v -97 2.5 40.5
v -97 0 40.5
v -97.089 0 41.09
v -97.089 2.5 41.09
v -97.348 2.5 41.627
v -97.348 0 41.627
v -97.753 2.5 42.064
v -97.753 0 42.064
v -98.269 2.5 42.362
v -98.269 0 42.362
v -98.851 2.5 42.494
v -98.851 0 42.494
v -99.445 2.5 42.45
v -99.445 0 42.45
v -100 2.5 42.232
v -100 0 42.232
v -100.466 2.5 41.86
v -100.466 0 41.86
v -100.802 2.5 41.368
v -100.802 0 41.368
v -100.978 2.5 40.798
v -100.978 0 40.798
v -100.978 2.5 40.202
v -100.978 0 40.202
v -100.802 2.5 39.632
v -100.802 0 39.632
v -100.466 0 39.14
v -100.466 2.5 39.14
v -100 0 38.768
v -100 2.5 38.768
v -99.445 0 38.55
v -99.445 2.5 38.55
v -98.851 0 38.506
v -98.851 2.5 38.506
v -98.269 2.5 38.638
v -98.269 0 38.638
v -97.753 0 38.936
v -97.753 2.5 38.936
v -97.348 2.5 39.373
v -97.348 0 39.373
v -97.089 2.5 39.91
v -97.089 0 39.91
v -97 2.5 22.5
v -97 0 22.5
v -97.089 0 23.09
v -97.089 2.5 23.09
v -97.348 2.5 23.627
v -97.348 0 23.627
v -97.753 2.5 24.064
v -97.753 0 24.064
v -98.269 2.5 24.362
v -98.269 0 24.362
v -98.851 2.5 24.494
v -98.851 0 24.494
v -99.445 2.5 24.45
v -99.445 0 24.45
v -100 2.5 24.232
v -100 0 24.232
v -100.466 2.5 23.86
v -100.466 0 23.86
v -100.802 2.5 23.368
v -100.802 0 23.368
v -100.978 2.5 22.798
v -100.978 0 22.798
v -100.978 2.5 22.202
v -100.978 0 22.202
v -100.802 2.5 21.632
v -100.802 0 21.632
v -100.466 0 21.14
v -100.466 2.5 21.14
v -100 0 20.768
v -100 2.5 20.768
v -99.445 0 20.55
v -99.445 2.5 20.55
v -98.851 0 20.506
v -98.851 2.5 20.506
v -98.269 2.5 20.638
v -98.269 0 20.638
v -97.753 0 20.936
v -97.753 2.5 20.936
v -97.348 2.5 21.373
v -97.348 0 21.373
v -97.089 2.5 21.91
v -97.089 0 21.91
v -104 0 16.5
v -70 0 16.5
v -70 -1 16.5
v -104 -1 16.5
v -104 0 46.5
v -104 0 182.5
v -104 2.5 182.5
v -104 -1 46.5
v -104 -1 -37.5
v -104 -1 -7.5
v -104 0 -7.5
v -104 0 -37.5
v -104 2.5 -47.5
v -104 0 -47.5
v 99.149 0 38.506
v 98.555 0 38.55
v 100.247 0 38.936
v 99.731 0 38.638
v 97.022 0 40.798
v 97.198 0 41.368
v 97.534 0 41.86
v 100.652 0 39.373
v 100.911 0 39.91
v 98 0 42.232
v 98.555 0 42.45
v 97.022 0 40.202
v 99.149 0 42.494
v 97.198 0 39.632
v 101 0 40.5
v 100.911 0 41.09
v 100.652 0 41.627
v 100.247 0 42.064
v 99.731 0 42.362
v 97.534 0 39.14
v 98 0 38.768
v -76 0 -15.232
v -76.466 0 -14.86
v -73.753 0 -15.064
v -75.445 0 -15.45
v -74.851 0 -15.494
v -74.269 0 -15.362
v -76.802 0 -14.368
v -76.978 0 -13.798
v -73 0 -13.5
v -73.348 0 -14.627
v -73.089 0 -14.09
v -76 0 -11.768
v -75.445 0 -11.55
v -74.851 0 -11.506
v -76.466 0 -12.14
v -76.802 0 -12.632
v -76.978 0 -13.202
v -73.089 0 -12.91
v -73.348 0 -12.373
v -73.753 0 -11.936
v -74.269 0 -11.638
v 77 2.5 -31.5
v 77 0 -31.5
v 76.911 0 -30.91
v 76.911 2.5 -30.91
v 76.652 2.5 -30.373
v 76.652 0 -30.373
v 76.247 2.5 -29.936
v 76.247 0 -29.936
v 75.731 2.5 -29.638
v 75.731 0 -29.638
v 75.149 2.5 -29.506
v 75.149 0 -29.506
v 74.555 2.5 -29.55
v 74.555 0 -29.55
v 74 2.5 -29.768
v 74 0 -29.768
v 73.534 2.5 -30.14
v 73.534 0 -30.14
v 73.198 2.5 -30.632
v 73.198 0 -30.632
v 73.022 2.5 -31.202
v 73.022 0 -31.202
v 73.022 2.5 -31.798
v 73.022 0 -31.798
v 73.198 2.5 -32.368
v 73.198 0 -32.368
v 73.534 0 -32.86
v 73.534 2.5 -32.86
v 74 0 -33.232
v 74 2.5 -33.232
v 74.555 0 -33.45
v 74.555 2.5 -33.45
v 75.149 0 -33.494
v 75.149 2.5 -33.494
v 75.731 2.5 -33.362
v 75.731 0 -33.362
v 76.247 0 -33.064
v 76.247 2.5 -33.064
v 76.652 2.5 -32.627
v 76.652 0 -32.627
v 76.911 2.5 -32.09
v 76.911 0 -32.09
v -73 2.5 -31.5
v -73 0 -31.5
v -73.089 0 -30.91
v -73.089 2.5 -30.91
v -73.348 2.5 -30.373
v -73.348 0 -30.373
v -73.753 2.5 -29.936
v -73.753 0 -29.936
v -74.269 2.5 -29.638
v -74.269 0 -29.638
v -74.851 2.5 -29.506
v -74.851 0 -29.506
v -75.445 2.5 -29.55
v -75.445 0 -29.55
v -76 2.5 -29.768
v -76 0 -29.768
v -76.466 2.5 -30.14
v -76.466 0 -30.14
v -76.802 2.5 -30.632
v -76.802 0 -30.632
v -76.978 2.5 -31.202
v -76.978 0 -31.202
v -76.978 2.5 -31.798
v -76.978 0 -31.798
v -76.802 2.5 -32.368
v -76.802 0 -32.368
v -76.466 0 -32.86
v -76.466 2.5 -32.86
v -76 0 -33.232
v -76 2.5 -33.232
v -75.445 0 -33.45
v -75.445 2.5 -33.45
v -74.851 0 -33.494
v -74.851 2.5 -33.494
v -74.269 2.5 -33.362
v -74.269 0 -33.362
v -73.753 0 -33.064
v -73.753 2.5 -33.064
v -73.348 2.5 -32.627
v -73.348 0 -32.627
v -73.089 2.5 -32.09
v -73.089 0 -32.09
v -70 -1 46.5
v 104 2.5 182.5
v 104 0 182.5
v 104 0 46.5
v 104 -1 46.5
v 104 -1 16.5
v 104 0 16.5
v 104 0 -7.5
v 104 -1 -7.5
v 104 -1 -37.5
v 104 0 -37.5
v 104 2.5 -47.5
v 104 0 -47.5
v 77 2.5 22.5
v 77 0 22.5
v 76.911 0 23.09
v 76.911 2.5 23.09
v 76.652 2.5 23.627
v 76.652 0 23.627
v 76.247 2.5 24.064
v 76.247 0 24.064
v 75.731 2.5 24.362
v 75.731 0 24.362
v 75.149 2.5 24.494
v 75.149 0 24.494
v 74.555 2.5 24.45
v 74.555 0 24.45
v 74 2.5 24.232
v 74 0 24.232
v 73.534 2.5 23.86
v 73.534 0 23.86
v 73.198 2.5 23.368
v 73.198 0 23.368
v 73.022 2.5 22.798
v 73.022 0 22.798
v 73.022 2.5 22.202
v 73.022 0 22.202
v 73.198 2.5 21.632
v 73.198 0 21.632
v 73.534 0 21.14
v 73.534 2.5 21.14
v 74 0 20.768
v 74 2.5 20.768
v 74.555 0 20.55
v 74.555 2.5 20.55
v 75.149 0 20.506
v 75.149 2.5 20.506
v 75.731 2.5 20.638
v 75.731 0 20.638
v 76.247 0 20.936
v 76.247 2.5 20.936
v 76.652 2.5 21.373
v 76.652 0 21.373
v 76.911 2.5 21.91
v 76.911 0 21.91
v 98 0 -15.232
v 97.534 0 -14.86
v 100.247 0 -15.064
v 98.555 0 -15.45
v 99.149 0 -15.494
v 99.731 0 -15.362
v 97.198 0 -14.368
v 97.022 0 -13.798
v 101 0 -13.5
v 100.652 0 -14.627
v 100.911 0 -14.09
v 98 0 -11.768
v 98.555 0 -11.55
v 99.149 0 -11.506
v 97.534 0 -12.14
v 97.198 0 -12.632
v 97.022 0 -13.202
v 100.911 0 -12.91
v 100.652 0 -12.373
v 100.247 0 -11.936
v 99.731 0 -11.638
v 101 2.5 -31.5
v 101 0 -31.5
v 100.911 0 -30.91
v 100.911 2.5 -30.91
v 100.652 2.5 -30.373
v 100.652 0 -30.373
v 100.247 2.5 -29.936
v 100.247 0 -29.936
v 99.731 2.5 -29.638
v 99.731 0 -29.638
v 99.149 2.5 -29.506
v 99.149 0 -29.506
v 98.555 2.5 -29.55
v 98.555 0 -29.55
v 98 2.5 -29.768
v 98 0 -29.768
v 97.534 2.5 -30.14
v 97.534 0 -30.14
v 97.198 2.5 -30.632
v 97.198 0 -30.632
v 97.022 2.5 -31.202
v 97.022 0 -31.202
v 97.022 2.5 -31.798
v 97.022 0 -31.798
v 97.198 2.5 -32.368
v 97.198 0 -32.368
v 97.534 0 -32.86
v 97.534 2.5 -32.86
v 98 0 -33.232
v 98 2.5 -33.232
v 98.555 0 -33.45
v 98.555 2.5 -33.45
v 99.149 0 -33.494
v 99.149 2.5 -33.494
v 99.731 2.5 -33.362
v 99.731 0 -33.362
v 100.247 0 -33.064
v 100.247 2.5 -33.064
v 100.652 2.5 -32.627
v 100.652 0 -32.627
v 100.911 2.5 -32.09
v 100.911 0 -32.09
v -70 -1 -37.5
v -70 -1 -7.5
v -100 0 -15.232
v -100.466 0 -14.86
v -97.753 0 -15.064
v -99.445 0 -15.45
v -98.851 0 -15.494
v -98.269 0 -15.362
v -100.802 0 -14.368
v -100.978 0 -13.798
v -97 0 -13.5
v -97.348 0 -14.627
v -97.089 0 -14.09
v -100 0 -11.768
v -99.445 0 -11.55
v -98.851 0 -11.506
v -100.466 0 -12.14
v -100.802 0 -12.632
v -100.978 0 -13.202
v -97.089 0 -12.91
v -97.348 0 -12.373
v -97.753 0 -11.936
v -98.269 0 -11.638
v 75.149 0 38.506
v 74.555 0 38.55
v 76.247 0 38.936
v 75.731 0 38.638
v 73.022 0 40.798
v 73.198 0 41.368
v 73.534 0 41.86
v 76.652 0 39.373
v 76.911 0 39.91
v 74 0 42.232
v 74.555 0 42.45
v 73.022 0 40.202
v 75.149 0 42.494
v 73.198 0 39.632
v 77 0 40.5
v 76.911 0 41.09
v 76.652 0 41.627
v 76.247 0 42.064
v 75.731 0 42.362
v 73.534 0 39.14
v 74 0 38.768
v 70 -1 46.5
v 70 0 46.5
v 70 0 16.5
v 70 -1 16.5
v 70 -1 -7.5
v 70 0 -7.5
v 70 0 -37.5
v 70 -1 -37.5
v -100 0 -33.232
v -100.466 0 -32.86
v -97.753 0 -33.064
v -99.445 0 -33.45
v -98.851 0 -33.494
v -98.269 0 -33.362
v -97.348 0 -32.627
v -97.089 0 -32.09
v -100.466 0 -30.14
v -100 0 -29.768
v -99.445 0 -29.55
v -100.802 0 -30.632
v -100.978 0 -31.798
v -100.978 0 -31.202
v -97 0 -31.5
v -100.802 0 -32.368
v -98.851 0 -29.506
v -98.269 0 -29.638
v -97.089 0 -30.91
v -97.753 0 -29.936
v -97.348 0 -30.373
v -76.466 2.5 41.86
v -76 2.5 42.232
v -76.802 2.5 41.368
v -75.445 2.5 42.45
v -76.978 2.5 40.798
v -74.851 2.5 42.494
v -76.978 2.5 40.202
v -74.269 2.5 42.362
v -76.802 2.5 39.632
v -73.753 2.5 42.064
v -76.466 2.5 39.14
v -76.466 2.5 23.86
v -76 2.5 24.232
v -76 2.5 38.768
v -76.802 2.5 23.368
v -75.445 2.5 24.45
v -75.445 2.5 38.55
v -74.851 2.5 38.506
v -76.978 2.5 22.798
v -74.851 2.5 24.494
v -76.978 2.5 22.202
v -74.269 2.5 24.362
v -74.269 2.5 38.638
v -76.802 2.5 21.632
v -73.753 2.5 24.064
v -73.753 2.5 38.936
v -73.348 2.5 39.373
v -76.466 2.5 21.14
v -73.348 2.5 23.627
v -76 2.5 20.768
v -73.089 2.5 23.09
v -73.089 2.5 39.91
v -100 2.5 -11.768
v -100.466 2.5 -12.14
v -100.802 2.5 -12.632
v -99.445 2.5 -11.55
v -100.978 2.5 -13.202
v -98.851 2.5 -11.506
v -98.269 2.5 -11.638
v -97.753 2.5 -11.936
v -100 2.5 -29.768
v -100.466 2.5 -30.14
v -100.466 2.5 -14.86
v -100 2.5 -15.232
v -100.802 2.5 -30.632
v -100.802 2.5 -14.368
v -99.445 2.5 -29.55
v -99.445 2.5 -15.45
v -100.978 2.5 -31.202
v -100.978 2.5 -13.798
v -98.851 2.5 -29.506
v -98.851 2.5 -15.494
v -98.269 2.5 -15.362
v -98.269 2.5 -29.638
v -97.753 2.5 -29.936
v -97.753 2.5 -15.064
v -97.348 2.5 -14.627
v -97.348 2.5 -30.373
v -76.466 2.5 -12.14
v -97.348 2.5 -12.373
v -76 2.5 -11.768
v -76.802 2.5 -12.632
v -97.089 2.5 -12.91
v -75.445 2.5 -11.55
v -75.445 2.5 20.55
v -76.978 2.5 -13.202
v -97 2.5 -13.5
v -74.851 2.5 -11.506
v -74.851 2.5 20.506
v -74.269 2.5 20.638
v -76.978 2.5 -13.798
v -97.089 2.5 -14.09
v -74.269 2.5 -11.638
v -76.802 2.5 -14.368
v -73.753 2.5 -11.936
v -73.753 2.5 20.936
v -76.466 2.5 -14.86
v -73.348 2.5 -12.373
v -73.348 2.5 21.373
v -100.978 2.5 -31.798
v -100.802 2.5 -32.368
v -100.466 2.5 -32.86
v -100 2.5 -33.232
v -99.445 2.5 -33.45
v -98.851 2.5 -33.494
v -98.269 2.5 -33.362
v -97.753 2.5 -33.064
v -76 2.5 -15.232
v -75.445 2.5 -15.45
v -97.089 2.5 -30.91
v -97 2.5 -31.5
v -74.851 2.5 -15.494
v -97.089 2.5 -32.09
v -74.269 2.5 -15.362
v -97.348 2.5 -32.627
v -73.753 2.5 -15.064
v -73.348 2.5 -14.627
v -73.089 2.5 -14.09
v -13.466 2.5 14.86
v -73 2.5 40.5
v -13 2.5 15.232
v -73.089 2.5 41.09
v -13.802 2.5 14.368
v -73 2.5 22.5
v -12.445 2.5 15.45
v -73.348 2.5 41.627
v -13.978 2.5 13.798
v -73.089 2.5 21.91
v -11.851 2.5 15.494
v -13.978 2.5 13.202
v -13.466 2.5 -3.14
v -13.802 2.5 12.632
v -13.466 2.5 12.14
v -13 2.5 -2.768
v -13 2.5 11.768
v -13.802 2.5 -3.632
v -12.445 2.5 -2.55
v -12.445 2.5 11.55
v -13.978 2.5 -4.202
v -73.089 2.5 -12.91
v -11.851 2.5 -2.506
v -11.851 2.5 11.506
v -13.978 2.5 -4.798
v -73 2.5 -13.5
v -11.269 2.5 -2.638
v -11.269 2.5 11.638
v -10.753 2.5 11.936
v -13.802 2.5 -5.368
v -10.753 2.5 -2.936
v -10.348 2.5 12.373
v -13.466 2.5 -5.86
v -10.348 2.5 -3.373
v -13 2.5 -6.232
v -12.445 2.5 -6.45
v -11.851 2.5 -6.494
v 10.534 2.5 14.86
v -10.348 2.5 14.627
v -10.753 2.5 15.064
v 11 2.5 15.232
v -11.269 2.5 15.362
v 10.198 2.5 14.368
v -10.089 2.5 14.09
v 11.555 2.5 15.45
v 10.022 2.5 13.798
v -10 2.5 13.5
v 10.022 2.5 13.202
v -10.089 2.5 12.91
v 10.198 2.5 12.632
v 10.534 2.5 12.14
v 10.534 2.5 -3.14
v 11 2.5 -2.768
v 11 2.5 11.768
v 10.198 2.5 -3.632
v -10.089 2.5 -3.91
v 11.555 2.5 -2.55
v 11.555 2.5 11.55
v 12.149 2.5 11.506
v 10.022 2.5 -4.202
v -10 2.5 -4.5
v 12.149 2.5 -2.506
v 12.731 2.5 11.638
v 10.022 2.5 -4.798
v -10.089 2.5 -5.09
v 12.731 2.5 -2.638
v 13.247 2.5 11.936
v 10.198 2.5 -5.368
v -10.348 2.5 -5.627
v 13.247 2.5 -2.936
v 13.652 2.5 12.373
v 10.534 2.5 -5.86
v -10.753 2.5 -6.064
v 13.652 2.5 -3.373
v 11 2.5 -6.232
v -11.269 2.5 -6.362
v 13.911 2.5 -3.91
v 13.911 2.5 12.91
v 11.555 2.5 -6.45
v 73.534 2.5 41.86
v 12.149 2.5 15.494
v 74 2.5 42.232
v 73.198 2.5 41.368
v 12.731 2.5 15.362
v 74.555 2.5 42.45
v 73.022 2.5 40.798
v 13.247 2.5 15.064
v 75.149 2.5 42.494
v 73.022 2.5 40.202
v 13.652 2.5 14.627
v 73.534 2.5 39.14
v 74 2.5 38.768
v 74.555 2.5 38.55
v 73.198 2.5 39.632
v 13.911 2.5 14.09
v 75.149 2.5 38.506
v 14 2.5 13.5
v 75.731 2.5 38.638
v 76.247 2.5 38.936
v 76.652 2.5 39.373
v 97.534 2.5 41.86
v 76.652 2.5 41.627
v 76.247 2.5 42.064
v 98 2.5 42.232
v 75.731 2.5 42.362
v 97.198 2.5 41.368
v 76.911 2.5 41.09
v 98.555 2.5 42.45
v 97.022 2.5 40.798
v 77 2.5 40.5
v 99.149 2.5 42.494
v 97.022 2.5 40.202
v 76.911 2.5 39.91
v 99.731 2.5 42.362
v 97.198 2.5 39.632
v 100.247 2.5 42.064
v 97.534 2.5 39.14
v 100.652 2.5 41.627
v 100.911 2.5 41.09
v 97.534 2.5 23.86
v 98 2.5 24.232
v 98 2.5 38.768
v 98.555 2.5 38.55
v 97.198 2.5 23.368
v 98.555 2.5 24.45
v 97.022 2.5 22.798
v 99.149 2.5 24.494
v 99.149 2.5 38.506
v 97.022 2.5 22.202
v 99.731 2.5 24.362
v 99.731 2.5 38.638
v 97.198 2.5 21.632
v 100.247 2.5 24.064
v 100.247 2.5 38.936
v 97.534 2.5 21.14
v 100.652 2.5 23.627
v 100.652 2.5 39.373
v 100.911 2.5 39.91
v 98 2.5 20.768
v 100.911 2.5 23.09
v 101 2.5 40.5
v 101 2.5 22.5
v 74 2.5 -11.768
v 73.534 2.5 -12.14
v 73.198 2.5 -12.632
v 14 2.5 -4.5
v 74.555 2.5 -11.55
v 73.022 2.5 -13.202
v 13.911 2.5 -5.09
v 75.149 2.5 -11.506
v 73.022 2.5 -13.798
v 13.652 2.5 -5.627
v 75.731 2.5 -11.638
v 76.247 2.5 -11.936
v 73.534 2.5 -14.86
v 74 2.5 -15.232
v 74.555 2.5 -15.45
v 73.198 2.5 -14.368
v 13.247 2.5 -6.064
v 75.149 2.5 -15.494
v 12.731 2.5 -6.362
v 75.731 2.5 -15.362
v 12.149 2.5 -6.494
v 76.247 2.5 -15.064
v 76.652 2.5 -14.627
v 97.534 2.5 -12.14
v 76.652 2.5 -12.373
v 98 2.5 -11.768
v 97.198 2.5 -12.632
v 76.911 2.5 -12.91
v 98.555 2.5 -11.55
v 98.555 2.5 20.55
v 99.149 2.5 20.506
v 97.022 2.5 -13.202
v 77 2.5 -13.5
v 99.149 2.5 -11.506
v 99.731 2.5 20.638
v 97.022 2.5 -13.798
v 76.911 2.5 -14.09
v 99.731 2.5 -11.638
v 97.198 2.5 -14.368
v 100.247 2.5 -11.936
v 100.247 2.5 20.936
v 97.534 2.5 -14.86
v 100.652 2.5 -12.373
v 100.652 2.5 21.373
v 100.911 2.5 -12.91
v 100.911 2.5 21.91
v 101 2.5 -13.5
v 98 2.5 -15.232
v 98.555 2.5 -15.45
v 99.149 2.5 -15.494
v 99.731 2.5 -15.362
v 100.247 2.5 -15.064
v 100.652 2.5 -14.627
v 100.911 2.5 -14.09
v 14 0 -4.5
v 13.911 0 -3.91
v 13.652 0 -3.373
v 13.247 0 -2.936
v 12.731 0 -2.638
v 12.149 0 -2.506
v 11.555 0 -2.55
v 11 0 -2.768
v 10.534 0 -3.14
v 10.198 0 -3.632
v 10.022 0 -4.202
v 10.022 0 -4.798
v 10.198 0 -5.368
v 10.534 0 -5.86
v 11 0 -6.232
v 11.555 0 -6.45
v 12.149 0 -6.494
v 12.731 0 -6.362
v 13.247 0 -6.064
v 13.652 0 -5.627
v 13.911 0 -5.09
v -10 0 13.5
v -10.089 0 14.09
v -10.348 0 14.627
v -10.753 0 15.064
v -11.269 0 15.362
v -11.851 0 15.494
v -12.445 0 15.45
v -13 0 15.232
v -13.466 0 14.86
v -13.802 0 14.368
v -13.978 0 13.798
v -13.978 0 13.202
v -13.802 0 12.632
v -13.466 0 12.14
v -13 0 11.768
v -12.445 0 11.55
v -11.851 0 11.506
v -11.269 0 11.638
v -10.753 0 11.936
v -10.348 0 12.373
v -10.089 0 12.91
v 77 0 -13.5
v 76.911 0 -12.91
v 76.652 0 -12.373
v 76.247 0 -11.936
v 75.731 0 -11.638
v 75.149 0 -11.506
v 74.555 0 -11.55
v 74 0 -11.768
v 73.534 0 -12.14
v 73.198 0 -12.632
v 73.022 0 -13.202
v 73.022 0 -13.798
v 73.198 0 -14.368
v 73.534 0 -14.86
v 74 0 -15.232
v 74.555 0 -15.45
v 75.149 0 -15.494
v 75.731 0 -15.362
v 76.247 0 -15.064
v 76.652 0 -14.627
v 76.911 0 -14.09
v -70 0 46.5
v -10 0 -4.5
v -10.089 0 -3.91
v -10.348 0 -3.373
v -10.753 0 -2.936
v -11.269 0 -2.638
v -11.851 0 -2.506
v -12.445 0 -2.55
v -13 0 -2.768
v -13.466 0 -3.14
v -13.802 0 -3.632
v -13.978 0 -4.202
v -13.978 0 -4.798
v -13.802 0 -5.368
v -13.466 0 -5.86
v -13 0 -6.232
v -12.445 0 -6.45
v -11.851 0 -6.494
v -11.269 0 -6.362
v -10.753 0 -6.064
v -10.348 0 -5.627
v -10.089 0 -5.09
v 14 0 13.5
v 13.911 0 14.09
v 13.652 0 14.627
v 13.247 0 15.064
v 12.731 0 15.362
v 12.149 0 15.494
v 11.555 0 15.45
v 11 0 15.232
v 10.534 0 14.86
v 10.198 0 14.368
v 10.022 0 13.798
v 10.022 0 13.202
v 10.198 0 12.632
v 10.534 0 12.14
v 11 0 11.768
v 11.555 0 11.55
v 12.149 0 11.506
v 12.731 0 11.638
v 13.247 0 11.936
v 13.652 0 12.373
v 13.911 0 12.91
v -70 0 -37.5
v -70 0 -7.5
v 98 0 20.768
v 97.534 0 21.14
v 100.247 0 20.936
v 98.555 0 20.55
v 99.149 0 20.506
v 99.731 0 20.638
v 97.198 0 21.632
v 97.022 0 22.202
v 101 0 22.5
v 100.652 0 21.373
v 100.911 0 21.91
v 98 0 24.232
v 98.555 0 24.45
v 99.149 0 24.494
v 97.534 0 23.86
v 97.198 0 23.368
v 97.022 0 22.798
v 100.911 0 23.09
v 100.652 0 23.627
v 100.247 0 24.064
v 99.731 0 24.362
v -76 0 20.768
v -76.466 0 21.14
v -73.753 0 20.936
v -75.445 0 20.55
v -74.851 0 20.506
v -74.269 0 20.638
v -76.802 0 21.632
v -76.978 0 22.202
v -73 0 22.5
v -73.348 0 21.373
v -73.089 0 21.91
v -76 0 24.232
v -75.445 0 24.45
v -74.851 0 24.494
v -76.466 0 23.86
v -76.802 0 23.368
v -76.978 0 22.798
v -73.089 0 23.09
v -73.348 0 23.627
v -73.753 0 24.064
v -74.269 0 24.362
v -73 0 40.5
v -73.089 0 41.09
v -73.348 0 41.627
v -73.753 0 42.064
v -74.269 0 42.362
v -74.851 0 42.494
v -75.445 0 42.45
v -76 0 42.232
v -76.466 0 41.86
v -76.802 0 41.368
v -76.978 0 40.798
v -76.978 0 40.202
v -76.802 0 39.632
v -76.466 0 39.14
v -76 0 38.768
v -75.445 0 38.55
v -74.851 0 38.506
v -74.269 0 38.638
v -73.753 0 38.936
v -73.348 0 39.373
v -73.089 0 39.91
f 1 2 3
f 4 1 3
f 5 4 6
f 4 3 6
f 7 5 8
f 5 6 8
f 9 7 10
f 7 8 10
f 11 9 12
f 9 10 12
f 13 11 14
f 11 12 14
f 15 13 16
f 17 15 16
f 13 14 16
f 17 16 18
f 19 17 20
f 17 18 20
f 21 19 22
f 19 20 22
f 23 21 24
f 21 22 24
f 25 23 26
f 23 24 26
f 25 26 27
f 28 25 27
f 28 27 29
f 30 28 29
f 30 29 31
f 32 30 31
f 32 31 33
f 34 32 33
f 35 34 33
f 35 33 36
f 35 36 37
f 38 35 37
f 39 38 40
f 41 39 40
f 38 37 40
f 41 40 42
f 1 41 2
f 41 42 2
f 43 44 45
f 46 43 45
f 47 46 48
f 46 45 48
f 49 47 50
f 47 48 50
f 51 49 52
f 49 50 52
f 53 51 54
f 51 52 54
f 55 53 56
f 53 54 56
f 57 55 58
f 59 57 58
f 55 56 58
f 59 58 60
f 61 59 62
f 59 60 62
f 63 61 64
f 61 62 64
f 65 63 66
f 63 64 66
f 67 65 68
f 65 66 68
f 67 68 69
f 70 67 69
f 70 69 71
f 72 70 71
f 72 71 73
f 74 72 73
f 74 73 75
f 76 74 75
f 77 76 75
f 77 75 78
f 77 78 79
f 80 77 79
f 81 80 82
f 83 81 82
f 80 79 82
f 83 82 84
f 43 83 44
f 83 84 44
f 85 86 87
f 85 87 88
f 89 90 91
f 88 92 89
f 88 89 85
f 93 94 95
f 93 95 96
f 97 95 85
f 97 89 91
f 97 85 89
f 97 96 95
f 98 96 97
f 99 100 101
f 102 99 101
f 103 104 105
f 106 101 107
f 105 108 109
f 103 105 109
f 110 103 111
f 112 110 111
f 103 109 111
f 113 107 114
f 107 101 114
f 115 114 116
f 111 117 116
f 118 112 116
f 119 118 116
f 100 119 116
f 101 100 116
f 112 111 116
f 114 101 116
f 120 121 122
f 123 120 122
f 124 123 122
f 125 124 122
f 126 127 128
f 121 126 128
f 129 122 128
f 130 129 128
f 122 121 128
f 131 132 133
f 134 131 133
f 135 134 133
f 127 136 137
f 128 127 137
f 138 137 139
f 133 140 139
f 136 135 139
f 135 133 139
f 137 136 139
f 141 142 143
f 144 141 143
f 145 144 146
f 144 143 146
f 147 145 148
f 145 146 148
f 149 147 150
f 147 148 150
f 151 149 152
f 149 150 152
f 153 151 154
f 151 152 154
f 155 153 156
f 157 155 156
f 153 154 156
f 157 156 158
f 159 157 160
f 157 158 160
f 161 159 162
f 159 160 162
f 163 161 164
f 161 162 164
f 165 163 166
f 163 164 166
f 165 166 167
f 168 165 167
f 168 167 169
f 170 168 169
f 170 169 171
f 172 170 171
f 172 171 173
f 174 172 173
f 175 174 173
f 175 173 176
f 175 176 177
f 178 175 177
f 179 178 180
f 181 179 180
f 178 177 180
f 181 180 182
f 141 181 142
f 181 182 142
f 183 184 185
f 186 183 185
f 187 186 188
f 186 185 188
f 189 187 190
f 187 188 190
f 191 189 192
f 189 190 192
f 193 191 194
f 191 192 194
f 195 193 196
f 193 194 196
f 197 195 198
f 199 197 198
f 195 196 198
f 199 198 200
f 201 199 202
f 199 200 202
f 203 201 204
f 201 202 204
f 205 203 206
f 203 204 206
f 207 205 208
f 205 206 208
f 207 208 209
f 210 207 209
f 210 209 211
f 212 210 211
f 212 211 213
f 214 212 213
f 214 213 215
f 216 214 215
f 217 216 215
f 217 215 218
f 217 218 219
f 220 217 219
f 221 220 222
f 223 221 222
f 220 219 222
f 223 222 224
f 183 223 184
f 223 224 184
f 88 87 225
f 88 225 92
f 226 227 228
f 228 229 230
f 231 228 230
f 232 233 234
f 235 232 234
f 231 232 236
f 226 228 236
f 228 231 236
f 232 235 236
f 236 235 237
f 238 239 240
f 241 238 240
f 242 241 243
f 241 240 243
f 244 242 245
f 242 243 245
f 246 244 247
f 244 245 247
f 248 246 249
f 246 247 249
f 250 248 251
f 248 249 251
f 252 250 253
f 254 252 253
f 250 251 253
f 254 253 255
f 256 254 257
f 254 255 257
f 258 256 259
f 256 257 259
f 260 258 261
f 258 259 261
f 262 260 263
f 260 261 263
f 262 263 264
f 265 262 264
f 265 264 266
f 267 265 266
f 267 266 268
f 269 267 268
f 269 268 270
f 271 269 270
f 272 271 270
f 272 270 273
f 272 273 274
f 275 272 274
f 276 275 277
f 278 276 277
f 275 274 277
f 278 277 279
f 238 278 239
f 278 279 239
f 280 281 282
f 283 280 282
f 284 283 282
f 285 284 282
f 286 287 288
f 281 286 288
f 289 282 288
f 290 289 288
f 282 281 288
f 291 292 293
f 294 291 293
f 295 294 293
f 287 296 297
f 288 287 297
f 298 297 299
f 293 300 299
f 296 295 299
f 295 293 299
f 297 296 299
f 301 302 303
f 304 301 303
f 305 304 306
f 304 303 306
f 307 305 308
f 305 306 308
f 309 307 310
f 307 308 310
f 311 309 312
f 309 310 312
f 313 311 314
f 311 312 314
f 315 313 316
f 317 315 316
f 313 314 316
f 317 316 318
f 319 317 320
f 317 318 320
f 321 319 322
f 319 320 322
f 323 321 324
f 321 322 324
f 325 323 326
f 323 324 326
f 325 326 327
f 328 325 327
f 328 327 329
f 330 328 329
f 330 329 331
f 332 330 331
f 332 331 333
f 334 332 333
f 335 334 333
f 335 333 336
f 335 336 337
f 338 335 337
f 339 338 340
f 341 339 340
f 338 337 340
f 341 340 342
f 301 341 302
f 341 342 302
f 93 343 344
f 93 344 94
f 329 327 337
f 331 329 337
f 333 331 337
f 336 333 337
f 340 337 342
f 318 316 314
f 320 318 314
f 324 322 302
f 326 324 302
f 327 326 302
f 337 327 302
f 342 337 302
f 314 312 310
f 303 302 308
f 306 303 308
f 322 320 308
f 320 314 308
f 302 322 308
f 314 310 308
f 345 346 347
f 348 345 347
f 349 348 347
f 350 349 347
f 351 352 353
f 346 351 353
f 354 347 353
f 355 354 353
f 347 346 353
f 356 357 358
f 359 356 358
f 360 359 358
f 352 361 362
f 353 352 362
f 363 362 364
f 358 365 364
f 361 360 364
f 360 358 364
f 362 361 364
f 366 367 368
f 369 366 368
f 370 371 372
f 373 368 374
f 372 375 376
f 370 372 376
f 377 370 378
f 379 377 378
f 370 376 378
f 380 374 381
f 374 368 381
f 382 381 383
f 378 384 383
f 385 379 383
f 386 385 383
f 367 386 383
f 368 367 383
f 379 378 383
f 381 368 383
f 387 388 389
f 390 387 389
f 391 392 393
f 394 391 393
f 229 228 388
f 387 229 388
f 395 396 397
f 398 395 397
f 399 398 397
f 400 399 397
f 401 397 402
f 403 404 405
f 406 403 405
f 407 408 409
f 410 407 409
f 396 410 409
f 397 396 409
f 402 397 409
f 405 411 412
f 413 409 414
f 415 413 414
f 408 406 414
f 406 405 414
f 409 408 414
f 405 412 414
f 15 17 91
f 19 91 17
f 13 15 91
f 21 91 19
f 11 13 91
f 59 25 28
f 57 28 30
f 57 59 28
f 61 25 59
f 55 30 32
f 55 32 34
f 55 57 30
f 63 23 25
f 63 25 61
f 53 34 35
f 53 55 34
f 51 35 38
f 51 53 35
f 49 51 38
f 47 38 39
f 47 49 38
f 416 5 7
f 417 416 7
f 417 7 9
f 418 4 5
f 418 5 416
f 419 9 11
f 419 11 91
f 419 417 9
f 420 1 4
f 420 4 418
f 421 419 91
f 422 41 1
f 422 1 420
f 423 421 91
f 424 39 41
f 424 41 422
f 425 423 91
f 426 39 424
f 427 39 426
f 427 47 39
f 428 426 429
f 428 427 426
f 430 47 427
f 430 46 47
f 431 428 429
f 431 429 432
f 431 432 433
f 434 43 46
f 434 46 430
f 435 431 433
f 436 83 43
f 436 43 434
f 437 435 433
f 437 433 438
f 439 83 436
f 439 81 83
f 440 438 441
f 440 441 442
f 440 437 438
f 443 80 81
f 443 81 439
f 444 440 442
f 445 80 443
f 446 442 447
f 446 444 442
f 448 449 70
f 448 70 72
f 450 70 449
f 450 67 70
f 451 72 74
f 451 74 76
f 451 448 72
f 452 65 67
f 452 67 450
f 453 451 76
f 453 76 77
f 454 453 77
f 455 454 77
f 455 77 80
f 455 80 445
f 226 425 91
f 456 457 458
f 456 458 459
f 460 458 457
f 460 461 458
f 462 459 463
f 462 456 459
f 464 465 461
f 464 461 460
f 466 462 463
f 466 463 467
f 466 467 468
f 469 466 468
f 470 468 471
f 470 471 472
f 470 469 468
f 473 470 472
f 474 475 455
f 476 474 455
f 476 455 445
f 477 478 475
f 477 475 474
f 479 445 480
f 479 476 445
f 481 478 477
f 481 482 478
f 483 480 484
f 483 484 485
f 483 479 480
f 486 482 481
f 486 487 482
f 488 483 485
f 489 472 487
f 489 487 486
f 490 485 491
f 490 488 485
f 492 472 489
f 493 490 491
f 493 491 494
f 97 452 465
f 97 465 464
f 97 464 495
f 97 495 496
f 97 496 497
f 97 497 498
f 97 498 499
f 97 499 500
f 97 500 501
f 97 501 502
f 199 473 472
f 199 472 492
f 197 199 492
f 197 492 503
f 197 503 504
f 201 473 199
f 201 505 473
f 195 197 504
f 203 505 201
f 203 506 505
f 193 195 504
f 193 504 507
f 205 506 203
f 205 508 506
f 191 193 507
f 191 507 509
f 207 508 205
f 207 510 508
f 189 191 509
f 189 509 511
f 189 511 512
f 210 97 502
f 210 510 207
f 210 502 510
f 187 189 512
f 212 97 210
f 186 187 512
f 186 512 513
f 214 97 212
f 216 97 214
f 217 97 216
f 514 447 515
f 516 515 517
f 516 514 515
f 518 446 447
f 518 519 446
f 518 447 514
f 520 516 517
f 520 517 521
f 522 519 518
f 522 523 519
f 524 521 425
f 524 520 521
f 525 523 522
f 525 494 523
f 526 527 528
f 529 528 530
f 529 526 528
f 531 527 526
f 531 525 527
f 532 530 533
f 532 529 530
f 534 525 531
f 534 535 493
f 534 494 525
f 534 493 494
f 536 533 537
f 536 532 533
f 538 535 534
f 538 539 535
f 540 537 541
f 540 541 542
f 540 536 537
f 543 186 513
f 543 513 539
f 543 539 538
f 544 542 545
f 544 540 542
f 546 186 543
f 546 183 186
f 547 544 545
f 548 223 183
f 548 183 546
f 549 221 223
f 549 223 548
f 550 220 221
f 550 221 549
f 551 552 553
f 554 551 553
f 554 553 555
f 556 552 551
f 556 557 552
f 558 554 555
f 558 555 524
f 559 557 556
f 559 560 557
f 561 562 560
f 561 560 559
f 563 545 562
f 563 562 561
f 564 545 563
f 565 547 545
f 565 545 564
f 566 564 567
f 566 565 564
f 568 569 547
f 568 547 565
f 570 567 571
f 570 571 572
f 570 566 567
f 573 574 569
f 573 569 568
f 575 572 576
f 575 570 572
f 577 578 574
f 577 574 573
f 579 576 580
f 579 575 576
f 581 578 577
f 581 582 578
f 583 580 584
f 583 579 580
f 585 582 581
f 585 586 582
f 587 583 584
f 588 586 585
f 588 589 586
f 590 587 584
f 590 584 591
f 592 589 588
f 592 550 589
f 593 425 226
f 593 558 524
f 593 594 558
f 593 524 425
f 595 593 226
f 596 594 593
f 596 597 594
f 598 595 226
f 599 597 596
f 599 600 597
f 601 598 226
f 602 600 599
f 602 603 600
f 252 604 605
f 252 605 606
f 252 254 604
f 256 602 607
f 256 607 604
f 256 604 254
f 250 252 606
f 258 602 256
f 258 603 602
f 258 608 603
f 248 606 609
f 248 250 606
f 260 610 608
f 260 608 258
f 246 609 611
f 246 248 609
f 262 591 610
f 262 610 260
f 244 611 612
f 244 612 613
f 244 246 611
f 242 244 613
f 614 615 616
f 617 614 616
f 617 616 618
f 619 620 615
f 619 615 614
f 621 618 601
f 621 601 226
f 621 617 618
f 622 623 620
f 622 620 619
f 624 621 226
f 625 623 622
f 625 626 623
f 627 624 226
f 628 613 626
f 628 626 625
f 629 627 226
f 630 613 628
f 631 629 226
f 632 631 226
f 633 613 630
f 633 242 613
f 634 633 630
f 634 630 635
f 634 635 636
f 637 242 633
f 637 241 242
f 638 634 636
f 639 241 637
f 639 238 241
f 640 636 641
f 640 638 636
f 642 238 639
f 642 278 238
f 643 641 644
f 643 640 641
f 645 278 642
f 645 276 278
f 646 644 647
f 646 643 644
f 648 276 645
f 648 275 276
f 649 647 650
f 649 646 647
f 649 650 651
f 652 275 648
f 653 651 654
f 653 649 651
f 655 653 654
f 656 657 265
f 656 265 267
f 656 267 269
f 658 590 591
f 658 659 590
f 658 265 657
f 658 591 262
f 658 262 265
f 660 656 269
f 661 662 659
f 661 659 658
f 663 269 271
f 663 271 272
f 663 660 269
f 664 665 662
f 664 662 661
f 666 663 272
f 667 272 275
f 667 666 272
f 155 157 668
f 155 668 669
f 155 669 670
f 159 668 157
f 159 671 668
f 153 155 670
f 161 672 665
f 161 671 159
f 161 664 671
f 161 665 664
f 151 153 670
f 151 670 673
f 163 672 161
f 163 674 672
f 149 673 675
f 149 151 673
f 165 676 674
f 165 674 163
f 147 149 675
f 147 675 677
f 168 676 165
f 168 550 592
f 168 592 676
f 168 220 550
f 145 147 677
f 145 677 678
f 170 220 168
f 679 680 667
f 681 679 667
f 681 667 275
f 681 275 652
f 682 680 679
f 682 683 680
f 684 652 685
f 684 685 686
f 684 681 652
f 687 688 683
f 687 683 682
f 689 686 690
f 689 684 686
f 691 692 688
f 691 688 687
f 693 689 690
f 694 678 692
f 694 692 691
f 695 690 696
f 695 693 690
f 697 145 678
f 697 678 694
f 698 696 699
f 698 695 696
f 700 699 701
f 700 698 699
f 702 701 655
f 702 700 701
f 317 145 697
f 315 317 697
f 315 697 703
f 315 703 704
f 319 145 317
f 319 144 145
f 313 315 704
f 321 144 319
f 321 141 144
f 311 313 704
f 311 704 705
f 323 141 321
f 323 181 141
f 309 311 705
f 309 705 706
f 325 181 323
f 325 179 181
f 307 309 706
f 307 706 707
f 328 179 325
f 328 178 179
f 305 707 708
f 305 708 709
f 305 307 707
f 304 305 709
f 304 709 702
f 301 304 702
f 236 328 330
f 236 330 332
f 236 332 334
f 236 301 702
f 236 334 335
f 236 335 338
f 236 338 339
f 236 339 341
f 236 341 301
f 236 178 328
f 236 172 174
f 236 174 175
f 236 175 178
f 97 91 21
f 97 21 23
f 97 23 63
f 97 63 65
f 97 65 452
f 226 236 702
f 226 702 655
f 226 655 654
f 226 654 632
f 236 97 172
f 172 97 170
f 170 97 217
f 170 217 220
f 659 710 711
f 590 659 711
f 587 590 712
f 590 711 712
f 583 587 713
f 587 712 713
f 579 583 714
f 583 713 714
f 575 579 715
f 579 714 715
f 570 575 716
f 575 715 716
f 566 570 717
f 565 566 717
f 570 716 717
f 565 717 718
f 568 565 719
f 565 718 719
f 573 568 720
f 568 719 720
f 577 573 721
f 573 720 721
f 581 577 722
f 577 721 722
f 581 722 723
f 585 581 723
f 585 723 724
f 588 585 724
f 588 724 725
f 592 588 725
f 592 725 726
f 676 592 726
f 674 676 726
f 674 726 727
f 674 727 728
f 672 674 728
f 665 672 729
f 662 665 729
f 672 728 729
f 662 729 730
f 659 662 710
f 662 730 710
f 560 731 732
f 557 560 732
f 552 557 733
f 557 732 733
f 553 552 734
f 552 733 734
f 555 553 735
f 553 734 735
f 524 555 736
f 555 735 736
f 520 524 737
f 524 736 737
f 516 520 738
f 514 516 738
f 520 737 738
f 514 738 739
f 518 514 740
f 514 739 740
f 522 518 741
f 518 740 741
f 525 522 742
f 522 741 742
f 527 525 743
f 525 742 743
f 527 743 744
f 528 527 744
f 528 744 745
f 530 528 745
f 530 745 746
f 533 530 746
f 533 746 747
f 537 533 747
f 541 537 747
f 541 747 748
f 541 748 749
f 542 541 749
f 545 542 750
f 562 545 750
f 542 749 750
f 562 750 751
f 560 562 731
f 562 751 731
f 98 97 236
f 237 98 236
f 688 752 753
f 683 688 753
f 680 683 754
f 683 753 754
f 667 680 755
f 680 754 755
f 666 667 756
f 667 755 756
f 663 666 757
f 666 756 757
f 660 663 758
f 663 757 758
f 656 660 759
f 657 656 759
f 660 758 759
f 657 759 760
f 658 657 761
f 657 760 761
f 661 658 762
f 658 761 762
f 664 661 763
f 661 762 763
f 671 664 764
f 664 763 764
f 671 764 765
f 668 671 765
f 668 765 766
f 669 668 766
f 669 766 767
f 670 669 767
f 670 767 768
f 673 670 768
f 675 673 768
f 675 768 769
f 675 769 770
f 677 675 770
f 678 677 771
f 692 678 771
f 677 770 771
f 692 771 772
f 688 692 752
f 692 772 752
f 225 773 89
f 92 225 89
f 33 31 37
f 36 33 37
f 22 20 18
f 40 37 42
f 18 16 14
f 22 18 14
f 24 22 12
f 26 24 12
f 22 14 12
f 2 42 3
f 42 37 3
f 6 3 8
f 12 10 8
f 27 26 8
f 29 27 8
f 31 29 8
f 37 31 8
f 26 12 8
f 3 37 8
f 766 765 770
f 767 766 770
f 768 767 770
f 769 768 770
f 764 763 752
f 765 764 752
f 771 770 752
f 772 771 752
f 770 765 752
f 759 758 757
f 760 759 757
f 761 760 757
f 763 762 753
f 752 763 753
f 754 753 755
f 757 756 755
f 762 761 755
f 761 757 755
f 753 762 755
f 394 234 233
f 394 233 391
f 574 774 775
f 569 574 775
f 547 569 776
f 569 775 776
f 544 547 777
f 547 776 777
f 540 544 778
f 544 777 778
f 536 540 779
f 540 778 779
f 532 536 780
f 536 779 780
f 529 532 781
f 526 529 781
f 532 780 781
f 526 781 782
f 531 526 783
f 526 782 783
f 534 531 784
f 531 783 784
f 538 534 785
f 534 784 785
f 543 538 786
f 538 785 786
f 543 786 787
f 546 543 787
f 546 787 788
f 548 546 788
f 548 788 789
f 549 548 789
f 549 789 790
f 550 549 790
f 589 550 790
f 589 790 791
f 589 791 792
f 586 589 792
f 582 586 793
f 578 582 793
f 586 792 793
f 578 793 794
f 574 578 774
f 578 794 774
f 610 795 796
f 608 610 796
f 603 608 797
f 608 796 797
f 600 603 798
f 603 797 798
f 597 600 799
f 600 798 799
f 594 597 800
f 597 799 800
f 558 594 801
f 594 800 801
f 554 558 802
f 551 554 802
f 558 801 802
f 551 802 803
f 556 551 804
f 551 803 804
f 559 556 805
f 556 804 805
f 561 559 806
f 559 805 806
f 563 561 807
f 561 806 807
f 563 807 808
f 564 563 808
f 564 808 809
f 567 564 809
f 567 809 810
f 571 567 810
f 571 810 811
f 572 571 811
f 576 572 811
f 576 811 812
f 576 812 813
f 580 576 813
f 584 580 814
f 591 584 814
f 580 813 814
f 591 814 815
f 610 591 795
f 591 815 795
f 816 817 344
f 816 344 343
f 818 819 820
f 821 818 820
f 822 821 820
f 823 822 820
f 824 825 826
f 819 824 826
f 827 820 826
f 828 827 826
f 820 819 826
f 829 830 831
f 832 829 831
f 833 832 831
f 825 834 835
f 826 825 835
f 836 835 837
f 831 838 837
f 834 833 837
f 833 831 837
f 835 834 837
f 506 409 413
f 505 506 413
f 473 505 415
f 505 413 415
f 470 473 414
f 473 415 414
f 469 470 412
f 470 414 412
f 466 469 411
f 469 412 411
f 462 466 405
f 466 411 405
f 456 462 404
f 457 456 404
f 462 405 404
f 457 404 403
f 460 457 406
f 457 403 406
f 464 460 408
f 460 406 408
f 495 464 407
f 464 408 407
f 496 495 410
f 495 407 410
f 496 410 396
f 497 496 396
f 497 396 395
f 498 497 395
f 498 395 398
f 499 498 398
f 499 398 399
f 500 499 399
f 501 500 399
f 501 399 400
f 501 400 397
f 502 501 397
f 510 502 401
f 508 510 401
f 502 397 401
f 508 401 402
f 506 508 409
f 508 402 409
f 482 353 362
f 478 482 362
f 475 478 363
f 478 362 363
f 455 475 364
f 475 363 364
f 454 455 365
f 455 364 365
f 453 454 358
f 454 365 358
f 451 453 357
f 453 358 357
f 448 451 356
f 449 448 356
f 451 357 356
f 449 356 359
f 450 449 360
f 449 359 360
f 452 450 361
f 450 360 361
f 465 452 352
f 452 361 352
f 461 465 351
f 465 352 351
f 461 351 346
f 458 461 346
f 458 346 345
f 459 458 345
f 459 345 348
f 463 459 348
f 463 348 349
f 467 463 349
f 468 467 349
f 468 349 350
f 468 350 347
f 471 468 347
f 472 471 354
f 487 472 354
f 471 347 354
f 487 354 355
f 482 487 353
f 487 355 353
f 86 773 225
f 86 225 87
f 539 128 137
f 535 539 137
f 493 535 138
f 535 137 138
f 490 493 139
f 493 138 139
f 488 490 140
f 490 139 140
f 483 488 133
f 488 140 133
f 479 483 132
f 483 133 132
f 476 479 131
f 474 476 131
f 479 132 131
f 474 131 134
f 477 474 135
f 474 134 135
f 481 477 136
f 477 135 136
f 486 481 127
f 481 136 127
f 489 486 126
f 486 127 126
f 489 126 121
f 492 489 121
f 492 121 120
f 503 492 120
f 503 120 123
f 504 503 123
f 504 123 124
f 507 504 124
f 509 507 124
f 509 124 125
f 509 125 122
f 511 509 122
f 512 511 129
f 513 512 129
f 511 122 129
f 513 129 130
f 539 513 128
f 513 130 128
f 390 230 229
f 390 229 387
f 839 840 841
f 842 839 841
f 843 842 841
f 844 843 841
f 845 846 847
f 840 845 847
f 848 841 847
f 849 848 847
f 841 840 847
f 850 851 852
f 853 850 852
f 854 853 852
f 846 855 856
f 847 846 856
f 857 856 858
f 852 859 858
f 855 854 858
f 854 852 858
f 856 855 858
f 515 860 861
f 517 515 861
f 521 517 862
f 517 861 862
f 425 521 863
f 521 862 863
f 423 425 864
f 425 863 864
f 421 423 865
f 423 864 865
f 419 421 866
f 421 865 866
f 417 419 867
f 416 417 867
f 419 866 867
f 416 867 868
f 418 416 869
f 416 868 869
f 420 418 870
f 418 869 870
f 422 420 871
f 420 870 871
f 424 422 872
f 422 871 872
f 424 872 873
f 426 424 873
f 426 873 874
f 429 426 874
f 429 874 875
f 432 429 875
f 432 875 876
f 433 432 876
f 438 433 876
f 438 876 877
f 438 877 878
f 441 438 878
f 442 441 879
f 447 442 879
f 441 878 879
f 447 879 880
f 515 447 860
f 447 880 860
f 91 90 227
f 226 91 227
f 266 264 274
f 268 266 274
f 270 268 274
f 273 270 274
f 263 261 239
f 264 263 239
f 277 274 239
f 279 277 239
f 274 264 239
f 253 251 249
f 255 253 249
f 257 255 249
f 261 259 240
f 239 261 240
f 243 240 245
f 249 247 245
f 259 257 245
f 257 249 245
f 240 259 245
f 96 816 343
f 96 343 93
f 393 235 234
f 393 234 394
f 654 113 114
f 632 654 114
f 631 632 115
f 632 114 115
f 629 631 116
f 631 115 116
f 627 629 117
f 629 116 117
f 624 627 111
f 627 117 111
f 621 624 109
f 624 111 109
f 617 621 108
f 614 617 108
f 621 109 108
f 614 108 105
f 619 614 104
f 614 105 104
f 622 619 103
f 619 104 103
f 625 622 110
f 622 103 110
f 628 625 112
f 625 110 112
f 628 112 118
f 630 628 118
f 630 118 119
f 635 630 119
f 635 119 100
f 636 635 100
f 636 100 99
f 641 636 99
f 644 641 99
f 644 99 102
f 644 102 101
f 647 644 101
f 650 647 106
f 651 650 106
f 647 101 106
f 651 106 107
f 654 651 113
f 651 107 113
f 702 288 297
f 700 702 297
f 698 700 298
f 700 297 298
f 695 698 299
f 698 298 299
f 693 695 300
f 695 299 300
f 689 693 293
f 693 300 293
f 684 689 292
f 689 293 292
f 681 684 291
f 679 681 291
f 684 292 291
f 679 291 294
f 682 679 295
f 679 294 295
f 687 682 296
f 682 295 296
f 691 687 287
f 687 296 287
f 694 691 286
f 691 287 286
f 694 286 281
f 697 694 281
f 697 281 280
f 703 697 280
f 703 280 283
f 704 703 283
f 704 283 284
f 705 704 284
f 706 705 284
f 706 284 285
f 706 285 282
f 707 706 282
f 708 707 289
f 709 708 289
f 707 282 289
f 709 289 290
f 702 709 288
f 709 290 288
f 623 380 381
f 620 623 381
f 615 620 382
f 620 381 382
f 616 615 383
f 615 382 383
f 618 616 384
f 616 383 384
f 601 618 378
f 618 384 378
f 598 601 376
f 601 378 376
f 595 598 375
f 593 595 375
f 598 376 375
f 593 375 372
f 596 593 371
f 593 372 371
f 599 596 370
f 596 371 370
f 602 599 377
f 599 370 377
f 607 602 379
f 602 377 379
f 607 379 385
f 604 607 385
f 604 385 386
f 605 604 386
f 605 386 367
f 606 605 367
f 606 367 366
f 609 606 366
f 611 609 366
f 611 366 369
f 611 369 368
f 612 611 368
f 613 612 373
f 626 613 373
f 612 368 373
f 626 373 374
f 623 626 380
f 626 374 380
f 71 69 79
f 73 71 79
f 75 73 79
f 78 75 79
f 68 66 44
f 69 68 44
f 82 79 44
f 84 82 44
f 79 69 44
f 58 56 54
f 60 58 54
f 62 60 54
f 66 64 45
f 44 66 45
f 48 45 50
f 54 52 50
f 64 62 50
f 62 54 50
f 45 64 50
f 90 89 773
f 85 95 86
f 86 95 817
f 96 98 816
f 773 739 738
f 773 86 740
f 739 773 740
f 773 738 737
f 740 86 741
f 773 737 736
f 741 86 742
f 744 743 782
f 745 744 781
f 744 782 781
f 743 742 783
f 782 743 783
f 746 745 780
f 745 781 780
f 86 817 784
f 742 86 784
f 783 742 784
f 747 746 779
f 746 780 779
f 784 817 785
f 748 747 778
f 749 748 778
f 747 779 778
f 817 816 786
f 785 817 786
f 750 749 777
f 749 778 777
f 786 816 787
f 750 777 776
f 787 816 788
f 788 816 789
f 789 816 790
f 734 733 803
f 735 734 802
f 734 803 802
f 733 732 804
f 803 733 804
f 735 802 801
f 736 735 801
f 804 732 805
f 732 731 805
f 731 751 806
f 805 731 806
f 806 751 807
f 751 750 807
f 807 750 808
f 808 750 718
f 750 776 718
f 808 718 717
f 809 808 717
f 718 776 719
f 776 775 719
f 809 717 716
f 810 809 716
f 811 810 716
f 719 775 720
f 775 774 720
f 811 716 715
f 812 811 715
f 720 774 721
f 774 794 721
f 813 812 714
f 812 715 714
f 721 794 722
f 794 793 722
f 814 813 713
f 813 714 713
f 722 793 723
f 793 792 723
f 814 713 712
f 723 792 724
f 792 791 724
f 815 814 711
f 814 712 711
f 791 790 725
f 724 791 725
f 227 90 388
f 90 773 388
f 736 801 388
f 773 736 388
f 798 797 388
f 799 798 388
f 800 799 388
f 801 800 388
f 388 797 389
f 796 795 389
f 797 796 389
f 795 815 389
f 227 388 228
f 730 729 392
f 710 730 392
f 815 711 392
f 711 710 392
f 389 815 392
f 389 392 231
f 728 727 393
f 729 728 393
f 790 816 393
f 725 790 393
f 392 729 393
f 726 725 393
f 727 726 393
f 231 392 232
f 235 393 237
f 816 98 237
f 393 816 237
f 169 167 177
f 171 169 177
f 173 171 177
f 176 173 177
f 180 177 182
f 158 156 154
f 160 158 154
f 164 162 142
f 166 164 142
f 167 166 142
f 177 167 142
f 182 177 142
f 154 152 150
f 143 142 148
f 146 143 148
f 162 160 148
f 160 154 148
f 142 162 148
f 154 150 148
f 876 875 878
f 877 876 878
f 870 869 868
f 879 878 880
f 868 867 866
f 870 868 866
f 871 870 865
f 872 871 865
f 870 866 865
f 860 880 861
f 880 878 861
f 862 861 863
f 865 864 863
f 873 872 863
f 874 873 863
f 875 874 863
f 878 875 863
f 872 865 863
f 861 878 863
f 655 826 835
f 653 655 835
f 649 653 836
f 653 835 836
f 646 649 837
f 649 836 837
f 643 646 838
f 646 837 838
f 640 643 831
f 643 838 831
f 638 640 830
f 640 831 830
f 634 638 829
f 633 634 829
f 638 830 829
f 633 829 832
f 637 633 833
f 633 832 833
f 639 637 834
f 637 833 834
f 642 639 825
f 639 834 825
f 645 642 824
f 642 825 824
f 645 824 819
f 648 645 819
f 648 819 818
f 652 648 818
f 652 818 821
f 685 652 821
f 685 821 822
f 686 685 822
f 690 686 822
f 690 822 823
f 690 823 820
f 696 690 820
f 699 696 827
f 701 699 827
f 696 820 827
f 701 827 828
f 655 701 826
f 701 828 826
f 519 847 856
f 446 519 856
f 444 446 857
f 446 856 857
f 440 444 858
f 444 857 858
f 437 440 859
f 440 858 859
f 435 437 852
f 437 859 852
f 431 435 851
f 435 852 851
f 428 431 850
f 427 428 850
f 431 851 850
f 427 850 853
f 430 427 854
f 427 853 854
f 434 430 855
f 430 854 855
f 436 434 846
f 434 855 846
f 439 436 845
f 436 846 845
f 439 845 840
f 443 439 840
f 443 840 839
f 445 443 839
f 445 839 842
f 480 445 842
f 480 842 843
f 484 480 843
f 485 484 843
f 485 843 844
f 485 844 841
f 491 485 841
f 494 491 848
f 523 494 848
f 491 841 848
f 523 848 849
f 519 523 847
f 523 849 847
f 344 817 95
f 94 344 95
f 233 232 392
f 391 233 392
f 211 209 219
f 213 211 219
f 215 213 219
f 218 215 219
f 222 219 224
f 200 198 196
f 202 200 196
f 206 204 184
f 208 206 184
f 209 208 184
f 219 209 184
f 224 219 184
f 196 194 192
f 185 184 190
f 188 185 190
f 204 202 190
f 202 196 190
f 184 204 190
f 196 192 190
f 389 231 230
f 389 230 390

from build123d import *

# Parameters (mm, degrees)
CROQUIS1_W              = 208
CROQUIS1_H              = 365
SALIENTE_EXTRUIR1_DEPTH = 2.5
CROQUIS2_W              = 34
CROQUIS2_H              = 30
SALIENTE_EXTRUIR2_DEPTH = 1
CROQUIS3_W              = 208
CROQUIS3_H              = 135
CORTAR_EXTRUIR1_DEPTH   = 4.5
SKETCH1_R               = 2
CUT_EXTRUDE1_DEPTH      = 2.5


with BuildPart() as part:
    # Croquis1 → Saliente-Extruir1 (new body)
    with BuildSketch(Plane(origin=(0, 0, 0), x_dir=(1, 0, 0), z_dir=(0, 1, 0))):
        Rectangle(CROQUIS1_W, CROQUIS1_H)
    extrude(amount=SALIENTE_EXTRUIR1_DEPTH)

    # Croquis2 → Saliente-Extruir2 (add)
    with BuildSketch(Plane(origin=(0, 0, 0), x_dir=(-1, 0, 0), z_dir=(0, -1, 0))):
        with Locations((87, -31.5)):
            Rectangle(CROQUIS2_W, CROQUIS2_H)
        with Locations((-87, -31.5)):
            Rectangle(CROQUIS2_W, CROQUIS2_H)
        with Locations((-87, 22.5)):
            Rectangle(CROQUIS2_W, CROQUIS2_H)
        with Locations((87, 22.5)):
            Rectangle(CROQUIS2_W, CROQUIS2_H)
    extrude(amount=SALIENTE_EXTRUIR2_DEPTH)

    # Croquis3 → Cortar-Extruir1 (cut, through all)
    with BuildSketch(Plane(origin=(0, 2.5, 0), x_dir=(1, 0, 0), z_dir=(0, 1, 0))):
        with Locations((0, 115)):
            Rectangle(CROQUIS3_W, CROQUIS3_H)
    extrude(amount=-CORTAR_EXTRUIR1_DEPTH, mode=Mode.SUBTRACT)

    # Sketch1 → Cut-Extrude1 (cut)
    with BuildSketch(Plane.XZ):
        with Locations((-99, 40.5)):
            Circle(SKETCH1_R)
        with Locations((-75, 40.5)):
            Circle(SKETCH1_R)
        with Locations((-99, 22.5)):
            Circle(SKETCH1_R)
        with Locations((-75, 22.5)):
            Circle(SKETCH1_R)
        with Locations((-99, -13.5)):
            Circle(SKETCH1_R)
        with Locations((-99, -31.5)):
            Circle(SKETCH1_R)
        with Locations((-75, -31.5)):
            Circle(SKETCH1_R)
        with Locations((-75, -13.5)):
            Circle(SKETCH1_R)
        with Locations((75, -13.5)):
            Circle(SKETCH1_R)
        with Locations((75, -31.5)):
            Circle(SKETCH1_R)
        with Locations((99, -31.5)):
            Circle(SKETCH1_R)
        with Locations((99, -13.5)):
            Circle(SKETCH1_R)
        with Locations((99, 22.5)):
            Circle(SKETCH1_R)
        with Locations((75, 22.5)):
            Circle(SKETCH1_R)
        with Locations((75, 40.5)):
            Circle(SKETCH1_R)
        with Locations((99, 40.5)):
            Circle(SKETCH1_R)
        with Locations((-12, 13.5)):
            Circle(SKETCH1_R)
        with Locations((-12, -4.5)):
            Circle(SKETCH1_R)
        with Locations((12, -4.5)):
            Circle(SKETCH1_R)
        with Locations((12, 13.5)):
            Circle(SKETCH1_R)
    extrude(amount=-CUT_EXTRUDE1_DEPTH, mode=Mode.SUBTRACT)


solid = part.part
